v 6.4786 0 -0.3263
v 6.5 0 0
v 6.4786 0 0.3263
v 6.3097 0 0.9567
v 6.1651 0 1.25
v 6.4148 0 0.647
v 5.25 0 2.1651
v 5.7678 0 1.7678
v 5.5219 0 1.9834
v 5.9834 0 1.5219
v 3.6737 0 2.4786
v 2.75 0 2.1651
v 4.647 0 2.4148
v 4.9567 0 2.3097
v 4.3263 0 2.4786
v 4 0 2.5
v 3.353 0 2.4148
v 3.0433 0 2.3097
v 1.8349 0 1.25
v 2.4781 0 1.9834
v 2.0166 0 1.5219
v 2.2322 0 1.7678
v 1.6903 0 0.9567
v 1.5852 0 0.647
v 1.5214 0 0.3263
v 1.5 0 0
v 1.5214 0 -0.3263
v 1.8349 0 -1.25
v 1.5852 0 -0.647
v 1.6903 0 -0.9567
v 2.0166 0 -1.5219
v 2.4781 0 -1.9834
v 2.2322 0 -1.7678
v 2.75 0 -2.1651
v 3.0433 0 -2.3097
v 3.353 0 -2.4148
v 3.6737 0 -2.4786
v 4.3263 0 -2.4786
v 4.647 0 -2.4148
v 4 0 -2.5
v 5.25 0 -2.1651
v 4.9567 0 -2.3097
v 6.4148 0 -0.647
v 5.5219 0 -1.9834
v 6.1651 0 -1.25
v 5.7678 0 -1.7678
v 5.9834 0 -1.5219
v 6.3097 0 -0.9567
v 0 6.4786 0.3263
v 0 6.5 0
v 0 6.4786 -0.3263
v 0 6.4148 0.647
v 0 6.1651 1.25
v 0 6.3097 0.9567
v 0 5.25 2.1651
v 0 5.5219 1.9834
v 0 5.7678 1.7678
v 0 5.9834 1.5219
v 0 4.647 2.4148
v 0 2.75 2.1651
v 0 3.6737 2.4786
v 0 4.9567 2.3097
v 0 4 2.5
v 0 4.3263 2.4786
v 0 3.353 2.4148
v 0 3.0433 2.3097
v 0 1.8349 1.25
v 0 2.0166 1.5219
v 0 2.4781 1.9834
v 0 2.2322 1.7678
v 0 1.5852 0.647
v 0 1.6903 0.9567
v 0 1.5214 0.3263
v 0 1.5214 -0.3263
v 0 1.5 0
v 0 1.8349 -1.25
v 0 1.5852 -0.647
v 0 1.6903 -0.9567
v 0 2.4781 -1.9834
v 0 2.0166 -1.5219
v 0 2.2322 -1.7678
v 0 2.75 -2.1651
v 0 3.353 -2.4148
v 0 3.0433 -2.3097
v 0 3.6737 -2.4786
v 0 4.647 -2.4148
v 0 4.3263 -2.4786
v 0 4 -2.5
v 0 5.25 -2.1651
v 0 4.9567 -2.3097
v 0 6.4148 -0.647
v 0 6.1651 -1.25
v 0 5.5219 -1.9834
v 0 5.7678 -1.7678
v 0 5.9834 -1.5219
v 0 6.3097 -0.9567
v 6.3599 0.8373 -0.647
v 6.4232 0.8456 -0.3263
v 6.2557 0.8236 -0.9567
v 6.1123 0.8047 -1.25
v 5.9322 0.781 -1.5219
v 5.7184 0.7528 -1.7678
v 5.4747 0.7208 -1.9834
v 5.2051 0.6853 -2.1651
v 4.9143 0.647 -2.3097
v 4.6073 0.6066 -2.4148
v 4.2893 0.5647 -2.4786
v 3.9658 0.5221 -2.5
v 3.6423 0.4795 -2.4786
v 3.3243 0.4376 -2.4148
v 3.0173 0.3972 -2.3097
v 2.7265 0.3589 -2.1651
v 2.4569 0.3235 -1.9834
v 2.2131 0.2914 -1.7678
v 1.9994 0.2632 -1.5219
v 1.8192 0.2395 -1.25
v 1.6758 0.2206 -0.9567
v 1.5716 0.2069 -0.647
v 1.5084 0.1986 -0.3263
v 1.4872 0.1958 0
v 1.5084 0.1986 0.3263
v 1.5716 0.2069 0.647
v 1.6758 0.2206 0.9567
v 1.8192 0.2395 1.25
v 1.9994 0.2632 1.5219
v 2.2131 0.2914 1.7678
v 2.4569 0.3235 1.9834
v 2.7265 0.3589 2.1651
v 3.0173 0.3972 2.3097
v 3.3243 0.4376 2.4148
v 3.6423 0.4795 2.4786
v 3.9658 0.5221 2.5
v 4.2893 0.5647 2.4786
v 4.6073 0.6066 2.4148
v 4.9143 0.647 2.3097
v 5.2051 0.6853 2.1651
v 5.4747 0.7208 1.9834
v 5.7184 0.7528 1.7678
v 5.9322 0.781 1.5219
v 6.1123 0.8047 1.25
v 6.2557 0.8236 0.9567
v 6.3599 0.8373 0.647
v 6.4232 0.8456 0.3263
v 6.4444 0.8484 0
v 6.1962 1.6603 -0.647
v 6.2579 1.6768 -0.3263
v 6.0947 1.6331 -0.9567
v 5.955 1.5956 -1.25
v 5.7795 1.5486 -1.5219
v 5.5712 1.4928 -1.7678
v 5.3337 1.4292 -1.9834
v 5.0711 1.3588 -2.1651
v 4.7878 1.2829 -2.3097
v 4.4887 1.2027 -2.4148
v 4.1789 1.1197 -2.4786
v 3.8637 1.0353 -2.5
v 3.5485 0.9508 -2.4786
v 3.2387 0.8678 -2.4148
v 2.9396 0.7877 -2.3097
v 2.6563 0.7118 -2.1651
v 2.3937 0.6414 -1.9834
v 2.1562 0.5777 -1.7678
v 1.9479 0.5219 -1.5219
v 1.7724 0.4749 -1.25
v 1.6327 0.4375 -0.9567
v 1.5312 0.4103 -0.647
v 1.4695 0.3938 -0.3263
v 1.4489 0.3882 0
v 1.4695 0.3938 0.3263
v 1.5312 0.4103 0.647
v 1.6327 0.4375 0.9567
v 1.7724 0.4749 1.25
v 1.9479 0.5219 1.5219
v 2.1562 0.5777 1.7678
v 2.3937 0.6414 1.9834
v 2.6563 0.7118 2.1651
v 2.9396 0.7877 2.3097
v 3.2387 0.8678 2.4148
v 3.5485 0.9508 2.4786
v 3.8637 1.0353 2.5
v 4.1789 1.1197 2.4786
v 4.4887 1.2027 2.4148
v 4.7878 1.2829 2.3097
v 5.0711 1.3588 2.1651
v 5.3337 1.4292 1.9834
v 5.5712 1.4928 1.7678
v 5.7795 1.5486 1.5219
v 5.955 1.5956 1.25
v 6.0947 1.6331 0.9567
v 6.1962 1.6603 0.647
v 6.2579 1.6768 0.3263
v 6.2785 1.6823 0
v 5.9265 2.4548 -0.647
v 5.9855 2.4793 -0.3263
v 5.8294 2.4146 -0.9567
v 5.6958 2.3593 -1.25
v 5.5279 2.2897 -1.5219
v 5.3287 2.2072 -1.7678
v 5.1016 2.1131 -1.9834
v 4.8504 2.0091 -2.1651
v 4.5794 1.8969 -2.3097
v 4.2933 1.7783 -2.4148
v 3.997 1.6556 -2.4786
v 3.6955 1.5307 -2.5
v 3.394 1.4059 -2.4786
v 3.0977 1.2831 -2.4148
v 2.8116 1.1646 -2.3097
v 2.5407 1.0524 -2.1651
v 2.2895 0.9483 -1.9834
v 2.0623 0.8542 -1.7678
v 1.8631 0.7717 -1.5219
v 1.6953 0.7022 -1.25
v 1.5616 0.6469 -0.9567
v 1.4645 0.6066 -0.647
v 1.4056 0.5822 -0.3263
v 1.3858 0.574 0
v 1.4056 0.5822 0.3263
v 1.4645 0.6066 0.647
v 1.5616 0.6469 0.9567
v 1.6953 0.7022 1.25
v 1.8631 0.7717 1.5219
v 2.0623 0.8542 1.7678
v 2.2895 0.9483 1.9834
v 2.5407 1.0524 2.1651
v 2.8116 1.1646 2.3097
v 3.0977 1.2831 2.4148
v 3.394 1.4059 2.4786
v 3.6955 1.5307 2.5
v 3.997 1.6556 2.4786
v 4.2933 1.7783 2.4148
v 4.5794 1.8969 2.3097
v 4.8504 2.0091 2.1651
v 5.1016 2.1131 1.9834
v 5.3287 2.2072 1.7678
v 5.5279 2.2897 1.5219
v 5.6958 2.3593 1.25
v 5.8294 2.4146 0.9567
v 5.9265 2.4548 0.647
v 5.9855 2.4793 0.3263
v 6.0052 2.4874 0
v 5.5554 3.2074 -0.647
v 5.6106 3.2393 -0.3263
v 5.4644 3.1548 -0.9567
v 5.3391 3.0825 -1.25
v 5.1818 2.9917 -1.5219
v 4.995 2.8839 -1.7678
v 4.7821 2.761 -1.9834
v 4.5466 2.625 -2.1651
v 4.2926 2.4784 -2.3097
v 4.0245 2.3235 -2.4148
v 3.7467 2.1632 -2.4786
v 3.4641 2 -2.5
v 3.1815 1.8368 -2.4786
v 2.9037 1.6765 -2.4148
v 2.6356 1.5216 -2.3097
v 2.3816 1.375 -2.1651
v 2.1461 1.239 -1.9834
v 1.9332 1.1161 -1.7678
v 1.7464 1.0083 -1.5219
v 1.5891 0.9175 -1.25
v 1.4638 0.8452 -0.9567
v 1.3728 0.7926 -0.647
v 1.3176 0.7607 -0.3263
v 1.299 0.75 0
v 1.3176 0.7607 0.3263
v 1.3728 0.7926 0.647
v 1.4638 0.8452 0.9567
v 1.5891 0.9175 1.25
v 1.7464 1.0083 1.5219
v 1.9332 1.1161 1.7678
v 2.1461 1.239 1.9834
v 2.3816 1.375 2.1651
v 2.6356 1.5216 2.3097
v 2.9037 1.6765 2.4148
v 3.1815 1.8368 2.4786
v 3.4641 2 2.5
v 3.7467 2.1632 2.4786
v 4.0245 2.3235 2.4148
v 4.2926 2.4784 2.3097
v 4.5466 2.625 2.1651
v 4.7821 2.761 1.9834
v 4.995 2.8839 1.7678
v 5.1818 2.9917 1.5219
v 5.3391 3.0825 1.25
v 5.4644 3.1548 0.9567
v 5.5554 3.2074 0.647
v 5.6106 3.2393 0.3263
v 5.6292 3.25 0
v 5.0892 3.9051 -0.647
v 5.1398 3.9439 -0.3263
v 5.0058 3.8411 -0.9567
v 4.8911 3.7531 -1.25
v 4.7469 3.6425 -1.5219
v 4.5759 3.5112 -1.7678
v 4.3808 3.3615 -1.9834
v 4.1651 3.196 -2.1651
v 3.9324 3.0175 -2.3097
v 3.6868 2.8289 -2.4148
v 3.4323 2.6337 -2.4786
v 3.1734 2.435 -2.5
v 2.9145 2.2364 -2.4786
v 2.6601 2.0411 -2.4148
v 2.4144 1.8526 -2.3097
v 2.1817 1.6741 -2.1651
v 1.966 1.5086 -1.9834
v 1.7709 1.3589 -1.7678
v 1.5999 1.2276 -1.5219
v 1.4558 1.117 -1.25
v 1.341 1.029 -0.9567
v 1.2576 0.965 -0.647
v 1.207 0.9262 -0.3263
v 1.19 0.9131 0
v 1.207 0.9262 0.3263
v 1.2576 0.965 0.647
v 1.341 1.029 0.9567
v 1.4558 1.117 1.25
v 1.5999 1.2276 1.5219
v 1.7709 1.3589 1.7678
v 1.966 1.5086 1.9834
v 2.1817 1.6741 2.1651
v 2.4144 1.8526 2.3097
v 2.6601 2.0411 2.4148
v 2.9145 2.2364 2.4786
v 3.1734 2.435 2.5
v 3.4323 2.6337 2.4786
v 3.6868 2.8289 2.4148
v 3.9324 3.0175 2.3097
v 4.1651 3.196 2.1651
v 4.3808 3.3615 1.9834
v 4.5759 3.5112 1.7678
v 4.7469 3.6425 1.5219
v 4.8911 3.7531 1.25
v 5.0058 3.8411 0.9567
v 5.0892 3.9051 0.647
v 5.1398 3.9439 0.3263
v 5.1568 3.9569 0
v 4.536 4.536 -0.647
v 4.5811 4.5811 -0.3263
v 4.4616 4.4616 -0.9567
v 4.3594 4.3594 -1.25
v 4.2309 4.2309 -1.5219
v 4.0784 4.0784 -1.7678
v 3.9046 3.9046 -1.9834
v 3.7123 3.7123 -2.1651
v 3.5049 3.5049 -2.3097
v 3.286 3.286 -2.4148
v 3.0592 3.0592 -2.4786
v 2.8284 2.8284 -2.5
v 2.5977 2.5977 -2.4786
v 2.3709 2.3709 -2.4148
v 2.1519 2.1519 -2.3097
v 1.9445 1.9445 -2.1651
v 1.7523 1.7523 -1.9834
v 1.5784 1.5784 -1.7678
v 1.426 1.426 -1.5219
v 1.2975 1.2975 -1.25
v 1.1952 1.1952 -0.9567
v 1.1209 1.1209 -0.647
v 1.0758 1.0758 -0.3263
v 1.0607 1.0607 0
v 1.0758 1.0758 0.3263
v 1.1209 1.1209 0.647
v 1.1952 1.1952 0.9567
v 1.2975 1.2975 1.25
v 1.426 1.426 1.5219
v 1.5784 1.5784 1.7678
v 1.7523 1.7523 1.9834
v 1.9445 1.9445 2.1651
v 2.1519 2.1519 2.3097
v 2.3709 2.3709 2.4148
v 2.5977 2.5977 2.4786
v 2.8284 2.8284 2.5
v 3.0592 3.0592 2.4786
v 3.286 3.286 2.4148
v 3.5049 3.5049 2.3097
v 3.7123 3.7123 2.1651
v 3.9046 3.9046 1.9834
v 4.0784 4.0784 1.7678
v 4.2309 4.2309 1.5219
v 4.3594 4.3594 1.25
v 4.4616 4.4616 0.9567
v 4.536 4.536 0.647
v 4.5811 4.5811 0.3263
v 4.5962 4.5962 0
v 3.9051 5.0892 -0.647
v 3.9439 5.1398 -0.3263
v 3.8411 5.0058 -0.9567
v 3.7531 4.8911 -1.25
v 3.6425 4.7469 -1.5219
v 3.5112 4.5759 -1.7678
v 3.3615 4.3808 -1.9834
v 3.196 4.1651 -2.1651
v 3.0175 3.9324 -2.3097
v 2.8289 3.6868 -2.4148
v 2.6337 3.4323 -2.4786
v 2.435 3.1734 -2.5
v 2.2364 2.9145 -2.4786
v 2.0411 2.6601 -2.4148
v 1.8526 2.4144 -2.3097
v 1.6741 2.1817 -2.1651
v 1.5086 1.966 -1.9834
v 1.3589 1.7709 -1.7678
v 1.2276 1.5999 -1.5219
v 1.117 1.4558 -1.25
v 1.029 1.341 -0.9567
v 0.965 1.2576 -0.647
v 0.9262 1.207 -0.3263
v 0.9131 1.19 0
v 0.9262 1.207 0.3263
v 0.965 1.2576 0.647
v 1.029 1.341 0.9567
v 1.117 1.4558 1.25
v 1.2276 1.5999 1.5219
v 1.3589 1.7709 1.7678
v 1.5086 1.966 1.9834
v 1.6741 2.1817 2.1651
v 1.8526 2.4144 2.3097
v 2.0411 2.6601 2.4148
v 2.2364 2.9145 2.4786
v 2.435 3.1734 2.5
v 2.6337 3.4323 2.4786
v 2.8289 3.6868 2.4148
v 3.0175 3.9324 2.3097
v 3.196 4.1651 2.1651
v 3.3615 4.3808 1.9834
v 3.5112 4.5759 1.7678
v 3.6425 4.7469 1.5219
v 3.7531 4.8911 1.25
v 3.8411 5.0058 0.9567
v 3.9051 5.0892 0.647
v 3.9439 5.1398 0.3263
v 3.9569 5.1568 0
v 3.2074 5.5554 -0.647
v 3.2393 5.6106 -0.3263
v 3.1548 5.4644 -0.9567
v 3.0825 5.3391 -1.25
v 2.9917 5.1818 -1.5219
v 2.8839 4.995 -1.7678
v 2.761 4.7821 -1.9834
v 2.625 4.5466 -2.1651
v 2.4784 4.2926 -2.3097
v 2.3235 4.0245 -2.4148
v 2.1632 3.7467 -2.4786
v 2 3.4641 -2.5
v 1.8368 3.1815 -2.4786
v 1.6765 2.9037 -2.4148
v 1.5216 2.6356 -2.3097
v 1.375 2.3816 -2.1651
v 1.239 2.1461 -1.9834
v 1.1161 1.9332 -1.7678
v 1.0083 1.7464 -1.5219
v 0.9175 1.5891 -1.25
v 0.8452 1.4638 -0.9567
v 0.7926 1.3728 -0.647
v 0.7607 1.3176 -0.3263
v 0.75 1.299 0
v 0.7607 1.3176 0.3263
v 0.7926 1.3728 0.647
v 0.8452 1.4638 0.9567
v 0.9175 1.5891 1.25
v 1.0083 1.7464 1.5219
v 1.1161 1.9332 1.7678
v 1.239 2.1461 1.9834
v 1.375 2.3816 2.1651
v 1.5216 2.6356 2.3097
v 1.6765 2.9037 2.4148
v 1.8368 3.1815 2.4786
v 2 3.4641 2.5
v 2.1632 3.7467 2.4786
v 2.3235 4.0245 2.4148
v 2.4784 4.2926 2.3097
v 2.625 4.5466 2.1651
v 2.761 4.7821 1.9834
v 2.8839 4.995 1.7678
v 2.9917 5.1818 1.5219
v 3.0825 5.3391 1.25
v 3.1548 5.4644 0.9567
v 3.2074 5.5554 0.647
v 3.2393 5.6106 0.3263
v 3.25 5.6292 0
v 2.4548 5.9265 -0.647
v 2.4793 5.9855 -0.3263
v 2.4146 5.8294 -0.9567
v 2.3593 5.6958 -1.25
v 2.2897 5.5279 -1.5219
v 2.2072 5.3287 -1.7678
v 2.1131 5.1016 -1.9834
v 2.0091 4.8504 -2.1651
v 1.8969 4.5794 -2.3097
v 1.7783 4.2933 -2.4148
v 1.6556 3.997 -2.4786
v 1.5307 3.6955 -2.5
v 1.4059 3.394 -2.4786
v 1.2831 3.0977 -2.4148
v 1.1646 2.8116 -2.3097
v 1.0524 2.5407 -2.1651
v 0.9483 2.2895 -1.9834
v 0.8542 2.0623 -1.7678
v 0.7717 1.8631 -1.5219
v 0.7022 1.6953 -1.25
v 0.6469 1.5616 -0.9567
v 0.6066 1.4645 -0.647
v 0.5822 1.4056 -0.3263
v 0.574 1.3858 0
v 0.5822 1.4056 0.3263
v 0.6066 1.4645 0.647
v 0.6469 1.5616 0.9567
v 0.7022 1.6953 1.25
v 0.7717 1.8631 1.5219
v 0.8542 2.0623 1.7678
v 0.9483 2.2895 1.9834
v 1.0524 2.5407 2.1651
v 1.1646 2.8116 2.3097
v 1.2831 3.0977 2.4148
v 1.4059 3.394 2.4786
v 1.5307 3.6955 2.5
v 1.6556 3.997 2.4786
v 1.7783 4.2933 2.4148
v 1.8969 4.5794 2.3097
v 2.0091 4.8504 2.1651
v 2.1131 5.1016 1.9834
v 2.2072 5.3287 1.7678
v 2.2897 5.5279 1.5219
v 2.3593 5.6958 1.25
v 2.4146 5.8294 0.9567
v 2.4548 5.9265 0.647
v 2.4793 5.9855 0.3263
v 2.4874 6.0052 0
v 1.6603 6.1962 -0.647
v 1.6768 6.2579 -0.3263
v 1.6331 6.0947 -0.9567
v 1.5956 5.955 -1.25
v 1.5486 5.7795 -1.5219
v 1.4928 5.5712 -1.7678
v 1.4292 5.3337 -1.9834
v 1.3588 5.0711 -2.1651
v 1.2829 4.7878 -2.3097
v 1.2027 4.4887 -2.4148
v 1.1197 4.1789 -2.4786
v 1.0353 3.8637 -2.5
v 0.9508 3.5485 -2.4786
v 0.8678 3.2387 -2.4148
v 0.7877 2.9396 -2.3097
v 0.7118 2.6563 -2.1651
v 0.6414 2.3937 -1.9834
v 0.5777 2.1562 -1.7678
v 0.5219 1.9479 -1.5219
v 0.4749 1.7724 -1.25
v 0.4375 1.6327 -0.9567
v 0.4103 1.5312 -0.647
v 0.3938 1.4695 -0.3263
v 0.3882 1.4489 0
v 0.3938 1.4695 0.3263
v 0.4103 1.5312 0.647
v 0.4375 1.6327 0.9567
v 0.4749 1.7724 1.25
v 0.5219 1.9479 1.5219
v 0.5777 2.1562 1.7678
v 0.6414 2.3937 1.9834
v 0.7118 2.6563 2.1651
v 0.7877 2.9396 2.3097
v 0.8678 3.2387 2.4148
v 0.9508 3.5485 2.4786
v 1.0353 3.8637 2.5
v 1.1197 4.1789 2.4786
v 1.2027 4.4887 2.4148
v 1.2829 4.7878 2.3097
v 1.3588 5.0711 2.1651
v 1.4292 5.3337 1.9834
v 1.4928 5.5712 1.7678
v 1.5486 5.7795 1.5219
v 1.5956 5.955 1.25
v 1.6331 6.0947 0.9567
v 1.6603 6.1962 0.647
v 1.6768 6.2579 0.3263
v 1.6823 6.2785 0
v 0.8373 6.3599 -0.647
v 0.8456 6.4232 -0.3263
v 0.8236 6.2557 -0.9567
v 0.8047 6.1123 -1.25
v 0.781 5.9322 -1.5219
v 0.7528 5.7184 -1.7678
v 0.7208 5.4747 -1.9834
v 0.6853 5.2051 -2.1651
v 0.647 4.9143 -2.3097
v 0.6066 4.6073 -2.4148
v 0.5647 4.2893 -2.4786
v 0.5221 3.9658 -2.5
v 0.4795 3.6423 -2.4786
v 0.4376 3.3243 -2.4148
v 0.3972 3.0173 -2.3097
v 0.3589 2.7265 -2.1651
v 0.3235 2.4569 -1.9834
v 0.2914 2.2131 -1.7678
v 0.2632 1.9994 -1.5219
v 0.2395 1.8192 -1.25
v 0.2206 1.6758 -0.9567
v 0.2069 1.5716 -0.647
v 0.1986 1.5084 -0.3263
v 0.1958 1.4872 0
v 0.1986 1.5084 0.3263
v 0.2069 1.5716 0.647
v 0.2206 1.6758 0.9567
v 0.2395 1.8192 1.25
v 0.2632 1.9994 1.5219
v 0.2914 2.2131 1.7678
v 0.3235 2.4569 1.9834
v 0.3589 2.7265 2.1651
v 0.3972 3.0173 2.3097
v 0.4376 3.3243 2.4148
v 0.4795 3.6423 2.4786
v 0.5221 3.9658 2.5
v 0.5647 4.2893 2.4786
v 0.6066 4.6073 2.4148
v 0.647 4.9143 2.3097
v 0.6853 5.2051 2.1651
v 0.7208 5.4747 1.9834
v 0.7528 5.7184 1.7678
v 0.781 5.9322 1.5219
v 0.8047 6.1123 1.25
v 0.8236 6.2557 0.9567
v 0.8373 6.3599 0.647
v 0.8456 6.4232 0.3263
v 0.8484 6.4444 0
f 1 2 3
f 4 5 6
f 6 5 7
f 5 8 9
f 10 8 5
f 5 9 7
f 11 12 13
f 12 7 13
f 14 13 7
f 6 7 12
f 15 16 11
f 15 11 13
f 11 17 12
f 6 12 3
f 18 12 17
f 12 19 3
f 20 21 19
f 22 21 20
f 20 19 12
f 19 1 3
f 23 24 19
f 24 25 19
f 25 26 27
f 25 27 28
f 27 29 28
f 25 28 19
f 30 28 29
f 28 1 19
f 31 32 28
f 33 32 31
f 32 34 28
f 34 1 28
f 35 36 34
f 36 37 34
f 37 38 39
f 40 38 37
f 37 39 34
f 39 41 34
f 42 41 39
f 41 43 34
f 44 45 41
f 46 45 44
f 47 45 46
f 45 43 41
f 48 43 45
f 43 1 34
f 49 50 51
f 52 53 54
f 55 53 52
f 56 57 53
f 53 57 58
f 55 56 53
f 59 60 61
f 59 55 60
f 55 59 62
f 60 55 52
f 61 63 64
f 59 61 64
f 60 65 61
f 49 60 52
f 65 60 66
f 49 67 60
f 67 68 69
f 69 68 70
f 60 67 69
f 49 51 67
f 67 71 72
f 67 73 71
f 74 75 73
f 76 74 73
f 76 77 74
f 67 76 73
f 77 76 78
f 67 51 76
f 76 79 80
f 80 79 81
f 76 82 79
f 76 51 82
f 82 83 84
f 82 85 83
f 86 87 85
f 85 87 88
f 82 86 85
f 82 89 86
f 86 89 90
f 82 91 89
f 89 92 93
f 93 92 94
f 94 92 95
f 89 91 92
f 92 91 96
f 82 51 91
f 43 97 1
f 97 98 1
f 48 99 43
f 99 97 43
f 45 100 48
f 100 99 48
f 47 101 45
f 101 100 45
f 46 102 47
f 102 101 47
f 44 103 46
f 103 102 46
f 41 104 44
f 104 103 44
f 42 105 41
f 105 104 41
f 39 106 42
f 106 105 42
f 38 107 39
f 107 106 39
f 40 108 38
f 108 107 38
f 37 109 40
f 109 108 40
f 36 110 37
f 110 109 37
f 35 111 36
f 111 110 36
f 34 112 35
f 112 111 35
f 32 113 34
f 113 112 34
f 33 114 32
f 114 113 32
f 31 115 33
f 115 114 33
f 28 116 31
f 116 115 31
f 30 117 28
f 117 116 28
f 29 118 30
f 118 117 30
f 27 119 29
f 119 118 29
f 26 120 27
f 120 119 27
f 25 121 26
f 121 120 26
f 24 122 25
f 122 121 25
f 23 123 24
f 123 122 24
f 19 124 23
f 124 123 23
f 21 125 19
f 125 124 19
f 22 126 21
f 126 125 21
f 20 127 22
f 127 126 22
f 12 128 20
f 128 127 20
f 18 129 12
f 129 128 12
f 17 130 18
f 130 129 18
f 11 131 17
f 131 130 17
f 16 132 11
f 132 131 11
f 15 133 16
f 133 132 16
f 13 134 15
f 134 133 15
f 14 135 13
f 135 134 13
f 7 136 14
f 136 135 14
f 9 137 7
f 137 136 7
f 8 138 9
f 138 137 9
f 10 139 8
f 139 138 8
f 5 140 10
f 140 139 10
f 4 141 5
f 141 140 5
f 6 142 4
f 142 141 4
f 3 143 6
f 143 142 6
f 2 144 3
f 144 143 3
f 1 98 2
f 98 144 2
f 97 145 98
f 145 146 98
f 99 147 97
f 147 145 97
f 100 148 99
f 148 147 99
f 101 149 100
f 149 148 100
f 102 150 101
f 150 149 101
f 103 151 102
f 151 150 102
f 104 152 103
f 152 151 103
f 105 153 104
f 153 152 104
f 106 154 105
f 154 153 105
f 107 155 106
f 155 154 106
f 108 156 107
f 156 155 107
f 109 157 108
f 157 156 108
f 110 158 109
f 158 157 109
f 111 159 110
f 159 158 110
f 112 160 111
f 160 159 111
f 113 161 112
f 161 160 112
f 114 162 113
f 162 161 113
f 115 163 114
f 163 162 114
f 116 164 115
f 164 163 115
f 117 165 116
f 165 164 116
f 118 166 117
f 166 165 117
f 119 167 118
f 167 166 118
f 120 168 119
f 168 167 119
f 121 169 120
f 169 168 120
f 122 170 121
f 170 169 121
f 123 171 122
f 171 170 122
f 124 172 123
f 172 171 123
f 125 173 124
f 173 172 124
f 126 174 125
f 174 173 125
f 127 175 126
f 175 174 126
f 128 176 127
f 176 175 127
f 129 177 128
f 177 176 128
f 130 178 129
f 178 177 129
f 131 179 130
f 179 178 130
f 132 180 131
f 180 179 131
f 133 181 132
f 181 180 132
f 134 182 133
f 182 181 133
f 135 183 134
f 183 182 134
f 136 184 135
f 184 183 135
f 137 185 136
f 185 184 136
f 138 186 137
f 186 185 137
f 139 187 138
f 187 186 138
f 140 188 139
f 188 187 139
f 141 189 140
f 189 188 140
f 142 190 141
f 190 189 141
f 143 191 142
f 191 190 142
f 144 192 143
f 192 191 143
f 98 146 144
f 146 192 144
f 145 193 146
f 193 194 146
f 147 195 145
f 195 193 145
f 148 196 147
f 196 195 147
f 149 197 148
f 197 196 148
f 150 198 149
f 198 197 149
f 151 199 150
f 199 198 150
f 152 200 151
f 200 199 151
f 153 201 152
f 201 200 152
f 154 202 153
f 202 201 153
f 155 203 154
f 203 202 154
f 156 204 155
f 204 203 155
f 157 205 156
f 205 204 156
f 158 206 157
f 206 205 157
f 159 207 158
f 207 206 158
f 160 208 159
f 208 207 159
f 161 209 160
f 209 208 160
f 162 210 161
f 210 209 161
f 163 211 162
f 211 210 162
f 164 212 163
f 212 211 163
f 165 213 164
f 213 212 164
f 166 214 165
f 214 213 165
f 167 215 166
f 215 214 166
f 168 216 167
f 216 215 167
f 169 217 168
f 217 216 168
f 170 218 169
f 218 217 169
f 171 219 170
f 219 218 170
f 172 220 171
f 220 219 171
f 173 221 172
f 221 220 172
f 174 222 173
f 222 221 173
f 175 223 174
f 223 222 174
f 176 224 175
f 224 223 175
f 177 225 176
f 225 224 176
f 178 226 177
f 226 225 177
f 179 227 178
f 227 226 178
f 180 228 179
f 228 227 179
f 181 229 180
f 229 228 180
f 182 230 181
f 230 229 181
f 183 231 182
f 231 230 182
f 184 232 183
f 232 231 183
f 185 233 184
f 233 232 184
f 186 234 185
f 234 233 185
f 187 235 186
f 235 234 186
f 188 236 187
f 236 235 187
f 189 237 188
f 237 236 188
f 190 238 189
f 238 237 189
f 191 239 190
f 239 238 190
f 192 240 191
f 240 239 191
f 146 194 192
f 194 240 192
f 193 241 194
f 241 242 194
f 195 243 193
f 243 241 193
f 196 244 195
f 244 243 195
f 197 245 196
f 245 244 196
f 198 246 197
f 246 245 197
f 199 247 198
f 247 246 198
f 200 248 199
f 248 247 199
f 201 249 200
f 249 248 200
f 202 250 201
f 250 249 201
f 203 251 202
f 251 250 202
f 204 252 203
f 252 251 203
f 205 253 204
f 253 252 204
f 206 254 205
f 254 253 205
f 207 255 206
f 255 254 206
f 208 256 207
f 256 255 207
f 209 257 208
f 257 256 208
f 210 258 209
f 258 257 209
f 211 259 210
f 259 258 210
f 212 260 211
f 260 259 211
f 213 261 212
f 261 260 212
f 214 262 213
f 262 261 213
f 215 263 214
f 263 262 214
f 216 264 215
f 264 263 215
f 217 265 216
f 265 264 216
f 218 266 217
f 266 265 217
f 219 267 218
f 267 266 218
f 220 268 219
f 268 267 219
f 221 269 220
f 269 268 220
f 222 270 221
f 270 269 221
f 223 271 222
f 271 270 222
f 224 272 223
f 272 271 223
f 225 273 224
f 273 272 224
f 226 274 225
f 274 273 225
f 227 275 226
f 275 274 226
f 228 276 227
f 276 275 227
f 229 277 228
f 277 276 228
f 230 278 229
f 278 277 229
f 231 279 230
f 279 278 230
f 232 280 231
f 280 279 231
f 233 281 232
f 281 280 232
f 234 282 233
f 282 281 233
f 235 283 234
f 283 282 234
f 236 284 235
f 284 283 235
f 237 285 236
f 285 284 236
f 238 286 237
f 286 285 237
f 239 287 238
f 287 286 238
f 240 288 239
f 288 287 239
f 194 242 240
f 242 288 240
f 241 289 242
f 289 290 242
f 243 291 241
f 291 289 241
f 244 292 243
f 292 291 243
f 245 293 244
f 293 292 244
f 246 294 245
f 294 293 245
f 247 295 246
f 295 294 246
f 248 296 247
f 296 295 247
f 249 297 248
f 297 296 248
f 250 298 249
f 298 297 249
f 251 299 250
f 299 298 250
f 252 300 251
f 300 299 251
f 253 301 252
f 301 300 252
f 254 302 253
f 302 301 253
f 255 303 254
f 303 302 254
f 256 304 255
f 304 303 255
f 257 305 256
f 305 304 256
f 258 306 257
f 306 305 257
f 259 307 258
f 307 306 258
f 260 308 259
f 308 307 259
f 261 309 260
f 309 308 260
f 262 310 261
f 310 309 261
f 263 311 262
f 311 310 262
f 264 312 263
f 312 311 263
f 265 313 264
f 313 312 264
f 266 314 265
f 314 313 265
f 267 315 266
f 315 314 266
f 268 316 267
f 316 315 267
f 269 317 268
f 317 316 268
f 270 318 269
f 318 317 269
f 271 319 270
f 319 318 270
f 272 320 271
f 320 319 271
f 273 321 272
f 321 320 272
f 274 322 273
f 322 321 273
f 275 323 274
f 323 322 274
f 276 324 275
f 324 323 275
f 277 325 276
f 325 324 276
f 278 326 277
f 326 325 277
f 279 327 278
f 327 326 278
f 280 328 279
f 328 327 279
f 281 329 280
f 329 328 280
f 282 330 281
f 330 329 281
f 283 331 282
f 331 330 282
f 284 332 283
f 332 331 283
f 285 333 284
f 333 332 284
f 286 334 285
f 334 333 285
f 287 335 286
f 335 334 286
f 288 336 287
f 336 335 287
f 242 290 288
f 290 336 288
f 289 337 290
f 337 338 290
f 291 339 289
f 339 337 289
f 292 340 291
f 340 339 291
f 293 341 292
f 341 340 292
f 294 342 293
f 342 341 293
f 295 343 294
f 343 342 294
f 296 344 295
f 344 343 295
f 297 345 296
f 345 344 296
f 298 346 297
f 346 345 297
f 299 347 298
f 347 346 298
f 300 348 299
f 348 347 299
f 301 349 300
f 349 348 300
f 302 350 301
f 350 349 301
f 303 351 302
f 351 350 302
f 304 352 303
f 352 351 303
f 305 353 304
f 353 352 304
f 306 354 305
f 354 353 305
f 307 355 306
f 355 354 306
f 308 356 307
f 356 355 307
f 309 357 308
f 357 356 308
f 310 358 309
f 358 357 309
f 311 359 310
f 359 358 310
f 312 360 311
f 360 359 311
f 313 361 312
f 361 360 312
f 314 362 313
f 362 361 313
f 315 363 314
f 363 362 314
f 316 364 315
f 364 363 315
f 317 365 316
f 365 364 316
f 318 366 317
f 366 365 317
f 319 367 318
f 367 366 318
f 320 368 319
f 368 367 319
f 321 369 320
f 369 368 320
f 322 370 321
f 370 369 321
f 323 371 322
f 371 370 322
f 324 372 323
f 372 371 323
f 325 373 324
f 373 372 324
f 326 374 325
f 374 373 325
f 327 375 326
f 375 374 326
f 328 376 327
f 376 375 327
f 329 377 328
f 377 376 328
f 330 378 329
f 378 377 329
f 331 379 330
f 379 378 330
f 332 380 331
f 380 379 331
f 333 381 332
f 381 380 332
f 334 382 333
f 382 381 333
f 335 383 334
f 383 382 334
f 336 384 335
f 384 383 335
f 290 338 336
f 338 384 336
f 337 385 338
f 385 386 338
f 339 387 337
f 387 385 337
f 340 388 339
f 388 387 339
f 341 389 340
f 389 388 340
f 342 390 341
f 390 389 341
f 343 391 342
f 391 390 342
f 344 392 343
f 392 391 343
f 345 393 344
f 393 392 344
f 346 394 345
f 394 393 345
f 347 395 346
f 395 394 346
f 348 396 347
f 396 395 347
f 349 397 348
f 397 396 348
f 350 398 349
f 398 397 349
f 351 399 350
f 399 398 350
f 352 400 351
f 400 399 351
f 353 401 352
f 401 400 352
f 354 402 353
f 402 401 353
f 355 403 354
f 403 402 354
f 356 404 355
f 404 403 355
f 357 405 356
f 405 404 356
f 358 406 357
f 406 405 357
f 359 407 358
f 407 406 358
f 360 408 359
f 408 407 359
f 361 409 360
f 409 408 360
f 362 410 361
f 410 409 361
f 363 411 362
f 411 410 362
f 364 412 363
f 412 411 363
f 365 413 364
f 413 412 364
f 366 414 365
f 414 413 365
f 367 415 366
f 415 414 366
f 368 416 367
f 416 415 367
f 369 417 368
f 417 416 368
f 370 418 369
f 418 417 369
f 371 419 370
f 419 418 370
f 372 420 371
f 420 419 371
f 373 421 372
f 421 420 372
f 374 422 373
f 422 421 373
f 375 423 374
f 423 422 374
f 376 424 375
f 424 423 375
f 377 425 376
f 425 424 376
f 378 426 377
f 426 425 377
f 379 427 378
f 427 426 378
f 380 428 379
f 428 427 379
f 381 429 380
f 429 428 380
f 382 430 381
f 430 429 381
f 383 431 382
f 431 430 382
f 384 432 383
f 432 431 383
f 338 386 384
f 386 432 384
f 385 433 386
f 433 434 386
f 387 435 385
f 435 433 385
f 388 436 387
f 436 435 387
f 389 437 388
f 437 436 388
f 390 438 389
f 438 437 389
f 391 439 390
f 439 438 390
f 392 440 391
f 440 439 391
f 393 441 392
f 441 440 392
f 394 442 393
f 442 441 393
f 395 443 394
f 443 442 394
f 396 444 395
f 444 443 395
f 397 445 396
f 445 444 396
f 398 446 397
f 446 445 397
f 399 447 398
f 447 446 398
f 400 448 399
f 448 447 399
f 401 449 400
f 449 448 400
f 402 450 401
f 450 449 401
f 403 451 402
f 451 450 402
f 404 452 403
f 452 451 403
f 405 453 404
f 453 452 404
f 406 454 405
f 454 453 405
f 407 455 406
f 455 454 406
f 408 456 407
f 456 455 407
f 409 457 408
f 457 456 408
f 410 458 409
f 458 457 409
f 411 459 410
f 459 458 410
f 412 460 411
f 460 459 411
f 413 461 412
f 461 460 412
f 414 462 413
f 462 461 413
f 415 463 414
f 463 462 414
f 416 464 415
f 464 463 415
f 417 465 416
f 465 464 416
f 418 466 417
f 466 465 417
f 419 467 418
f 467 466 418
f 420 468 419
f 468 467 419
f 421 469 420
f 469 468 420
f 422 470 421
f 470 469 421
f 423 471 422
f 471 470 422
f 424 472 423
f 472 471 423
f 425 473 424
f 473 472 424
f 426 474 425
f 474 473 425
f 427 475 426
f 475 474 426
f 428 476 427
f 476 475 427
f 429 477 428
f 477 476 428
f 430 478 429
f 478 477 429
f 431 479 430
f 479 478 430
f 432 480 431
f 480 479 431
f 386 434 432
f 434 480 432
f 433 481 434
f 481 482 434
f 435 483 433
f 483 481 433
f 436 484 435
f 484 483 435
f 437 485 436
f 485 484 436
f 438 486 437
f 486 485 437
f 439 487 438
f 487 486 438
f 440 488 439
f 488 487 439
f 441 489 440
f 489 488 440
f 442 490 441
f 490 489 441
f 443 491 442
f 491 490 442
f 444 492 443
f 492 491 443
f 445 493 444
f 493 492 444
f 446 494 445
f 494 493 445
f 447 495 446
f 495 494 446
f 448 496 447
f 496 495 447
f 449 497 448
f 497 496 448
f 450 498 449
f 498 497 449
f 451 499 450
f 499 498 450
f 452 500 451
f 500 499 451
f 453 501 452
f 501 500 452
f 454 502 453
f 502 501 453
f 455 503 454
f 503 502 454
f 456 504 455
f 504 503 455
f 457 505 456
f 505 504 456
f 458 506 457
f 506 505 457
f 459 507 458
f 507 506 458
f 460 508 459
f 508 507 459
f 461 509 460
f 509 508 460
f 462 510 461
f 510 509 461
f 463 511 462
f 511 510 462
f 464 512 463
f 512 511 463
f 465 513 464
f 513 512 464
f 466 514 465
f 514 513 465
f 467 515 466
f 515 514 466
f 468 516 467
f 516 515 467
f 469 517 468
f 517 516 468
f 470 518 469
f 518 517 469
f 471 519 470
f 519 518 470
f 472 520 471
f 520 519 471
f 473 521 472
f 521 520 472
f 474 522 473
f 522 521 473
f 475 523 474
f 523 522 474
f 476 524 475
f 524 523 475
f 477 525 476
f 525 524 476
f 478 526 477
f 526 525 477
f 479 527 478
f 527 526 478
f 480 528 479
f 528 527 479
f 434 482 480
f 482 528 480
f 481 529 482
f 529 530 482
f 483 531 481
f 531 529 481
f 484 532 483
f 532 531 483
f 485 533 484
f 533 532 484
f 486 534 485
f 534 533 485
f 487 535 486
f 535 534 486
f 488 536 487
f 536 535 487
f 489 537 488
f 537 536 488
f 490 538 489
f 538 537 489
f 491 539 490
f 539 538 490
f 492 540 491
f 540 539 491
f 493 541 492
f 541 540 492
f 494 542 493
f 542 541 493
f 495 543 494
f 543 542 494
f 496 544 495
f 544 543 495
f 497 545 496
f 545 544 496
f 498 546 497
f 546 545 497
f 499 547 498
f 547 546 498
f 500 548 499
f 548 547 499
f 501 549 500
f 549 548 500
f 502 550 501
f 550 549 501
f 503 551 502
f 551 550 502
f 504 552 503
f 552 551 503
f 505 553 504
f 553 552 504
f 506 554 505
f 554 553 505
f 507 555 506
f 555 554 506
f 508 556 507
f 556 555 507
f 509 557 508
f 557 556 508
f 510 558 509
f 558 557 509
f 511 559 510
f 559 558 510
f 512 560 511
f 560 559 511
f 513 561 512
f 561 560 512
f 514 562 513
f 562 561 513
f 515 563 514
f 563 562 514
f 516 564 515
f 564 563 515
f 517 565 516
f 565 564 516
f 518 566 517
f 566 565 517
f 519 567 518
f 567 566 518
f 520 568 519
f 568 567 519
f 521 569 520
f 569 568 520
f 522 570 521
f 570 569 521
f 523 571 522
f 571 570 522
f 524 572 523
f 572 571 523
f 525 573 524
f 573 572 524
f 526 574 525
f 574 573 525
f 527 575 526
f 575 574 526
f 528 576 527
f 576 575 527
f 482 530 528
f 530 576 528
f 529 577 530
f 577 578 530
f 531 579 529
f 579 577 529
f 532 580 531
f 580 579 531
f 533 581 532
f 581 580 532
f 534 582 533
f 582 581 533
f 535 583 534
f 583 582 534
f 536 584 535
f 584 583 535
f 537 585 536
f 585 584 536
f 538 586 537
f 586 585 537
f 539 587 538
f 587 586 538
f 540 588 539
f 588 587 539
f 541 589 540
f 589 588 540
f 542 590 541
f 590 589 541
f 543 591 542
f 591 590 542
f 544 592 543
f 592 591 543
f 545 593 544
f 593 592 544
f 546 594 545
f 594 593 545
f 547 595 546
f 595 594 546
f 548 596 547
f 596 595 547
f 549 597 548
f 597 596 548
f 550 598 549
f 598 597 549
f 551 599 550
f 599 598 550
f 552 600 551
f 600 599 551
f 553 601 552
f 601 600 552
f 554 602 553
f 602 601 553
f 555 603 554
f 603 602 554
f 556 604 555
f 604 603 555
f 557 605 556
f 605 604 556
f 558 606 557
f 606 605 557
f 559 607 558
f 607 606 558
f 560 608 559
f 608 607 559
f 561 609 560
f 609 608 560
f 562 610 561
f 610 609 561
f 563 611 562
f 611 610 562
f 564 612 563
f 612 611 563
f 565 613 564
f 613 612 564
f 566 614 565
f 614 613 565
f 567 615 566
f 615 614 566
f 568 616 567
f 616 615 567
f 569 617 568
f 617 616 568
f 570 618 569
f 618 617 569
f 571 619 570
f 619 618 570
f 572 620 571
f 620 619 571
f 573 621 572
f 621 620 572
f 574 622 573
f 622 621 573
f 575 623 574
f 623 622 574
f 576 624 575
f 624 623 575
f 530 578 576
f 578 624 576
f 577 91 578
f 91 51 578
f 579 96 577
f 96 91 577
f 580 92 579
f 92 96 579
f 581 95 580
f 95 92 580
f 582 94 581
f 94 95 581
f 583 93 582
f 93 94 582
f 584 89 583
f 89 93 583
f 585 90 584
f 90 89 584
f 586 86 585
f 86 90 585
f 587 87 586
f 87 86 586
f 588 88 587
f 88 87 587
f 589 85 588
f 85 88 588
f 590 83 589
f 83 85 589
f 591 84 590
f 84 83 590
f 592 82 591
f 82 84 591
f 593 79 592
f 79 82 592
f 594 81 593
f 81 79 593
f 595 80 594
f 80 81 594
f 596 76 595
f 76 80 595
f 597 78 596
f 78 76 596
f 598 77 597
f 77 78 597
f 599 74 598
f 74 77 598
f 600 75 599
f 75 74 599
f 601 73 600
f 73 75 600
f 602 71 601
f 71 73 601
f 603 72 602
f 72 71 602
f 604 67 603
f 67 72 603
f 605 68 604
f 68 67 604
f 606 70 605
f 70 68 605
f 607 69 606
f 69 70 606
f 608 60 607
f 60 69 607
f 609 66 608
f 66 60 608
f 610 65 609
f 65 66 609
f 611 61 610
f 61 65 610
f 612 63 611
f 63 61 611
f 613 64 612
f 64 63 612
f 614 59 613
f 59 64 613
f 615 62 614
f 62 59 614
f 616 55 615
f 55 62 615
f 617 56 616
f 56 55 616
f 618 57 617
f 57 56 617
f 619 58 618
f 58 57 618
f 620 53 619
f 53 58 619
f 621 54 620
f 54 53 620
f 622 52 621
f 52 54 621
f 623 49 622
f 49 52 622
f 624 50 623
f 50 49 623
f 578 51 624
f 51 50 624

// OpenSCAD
// file: skadis.scad
skadis_hole = [5, 5, 15]; // width, thickness, height
skadis_hole_d = skadis_hole.x;
skadis_hole_gap = [15, undef, 25];
skadis_hole_chamfer_d = 3;

skadis_rounding_r = 10;
skadis_margin = [17.5, 12.5];


module hook_part_small_bend() {
    rotate_extrude(angle = 90)
        translate([(skadis_hole.y + skadis_hole_chamfer_d) / 2, 0])
        circle(r = skadis_hole_d / 2);
}

module hook_base() {
    $fn = 48;

    hook_part_small_bend();
}
// main file
include <skadis.scad>

rod_inner_d = 5.5;
rod_outer_d = 10;


hook_base();
